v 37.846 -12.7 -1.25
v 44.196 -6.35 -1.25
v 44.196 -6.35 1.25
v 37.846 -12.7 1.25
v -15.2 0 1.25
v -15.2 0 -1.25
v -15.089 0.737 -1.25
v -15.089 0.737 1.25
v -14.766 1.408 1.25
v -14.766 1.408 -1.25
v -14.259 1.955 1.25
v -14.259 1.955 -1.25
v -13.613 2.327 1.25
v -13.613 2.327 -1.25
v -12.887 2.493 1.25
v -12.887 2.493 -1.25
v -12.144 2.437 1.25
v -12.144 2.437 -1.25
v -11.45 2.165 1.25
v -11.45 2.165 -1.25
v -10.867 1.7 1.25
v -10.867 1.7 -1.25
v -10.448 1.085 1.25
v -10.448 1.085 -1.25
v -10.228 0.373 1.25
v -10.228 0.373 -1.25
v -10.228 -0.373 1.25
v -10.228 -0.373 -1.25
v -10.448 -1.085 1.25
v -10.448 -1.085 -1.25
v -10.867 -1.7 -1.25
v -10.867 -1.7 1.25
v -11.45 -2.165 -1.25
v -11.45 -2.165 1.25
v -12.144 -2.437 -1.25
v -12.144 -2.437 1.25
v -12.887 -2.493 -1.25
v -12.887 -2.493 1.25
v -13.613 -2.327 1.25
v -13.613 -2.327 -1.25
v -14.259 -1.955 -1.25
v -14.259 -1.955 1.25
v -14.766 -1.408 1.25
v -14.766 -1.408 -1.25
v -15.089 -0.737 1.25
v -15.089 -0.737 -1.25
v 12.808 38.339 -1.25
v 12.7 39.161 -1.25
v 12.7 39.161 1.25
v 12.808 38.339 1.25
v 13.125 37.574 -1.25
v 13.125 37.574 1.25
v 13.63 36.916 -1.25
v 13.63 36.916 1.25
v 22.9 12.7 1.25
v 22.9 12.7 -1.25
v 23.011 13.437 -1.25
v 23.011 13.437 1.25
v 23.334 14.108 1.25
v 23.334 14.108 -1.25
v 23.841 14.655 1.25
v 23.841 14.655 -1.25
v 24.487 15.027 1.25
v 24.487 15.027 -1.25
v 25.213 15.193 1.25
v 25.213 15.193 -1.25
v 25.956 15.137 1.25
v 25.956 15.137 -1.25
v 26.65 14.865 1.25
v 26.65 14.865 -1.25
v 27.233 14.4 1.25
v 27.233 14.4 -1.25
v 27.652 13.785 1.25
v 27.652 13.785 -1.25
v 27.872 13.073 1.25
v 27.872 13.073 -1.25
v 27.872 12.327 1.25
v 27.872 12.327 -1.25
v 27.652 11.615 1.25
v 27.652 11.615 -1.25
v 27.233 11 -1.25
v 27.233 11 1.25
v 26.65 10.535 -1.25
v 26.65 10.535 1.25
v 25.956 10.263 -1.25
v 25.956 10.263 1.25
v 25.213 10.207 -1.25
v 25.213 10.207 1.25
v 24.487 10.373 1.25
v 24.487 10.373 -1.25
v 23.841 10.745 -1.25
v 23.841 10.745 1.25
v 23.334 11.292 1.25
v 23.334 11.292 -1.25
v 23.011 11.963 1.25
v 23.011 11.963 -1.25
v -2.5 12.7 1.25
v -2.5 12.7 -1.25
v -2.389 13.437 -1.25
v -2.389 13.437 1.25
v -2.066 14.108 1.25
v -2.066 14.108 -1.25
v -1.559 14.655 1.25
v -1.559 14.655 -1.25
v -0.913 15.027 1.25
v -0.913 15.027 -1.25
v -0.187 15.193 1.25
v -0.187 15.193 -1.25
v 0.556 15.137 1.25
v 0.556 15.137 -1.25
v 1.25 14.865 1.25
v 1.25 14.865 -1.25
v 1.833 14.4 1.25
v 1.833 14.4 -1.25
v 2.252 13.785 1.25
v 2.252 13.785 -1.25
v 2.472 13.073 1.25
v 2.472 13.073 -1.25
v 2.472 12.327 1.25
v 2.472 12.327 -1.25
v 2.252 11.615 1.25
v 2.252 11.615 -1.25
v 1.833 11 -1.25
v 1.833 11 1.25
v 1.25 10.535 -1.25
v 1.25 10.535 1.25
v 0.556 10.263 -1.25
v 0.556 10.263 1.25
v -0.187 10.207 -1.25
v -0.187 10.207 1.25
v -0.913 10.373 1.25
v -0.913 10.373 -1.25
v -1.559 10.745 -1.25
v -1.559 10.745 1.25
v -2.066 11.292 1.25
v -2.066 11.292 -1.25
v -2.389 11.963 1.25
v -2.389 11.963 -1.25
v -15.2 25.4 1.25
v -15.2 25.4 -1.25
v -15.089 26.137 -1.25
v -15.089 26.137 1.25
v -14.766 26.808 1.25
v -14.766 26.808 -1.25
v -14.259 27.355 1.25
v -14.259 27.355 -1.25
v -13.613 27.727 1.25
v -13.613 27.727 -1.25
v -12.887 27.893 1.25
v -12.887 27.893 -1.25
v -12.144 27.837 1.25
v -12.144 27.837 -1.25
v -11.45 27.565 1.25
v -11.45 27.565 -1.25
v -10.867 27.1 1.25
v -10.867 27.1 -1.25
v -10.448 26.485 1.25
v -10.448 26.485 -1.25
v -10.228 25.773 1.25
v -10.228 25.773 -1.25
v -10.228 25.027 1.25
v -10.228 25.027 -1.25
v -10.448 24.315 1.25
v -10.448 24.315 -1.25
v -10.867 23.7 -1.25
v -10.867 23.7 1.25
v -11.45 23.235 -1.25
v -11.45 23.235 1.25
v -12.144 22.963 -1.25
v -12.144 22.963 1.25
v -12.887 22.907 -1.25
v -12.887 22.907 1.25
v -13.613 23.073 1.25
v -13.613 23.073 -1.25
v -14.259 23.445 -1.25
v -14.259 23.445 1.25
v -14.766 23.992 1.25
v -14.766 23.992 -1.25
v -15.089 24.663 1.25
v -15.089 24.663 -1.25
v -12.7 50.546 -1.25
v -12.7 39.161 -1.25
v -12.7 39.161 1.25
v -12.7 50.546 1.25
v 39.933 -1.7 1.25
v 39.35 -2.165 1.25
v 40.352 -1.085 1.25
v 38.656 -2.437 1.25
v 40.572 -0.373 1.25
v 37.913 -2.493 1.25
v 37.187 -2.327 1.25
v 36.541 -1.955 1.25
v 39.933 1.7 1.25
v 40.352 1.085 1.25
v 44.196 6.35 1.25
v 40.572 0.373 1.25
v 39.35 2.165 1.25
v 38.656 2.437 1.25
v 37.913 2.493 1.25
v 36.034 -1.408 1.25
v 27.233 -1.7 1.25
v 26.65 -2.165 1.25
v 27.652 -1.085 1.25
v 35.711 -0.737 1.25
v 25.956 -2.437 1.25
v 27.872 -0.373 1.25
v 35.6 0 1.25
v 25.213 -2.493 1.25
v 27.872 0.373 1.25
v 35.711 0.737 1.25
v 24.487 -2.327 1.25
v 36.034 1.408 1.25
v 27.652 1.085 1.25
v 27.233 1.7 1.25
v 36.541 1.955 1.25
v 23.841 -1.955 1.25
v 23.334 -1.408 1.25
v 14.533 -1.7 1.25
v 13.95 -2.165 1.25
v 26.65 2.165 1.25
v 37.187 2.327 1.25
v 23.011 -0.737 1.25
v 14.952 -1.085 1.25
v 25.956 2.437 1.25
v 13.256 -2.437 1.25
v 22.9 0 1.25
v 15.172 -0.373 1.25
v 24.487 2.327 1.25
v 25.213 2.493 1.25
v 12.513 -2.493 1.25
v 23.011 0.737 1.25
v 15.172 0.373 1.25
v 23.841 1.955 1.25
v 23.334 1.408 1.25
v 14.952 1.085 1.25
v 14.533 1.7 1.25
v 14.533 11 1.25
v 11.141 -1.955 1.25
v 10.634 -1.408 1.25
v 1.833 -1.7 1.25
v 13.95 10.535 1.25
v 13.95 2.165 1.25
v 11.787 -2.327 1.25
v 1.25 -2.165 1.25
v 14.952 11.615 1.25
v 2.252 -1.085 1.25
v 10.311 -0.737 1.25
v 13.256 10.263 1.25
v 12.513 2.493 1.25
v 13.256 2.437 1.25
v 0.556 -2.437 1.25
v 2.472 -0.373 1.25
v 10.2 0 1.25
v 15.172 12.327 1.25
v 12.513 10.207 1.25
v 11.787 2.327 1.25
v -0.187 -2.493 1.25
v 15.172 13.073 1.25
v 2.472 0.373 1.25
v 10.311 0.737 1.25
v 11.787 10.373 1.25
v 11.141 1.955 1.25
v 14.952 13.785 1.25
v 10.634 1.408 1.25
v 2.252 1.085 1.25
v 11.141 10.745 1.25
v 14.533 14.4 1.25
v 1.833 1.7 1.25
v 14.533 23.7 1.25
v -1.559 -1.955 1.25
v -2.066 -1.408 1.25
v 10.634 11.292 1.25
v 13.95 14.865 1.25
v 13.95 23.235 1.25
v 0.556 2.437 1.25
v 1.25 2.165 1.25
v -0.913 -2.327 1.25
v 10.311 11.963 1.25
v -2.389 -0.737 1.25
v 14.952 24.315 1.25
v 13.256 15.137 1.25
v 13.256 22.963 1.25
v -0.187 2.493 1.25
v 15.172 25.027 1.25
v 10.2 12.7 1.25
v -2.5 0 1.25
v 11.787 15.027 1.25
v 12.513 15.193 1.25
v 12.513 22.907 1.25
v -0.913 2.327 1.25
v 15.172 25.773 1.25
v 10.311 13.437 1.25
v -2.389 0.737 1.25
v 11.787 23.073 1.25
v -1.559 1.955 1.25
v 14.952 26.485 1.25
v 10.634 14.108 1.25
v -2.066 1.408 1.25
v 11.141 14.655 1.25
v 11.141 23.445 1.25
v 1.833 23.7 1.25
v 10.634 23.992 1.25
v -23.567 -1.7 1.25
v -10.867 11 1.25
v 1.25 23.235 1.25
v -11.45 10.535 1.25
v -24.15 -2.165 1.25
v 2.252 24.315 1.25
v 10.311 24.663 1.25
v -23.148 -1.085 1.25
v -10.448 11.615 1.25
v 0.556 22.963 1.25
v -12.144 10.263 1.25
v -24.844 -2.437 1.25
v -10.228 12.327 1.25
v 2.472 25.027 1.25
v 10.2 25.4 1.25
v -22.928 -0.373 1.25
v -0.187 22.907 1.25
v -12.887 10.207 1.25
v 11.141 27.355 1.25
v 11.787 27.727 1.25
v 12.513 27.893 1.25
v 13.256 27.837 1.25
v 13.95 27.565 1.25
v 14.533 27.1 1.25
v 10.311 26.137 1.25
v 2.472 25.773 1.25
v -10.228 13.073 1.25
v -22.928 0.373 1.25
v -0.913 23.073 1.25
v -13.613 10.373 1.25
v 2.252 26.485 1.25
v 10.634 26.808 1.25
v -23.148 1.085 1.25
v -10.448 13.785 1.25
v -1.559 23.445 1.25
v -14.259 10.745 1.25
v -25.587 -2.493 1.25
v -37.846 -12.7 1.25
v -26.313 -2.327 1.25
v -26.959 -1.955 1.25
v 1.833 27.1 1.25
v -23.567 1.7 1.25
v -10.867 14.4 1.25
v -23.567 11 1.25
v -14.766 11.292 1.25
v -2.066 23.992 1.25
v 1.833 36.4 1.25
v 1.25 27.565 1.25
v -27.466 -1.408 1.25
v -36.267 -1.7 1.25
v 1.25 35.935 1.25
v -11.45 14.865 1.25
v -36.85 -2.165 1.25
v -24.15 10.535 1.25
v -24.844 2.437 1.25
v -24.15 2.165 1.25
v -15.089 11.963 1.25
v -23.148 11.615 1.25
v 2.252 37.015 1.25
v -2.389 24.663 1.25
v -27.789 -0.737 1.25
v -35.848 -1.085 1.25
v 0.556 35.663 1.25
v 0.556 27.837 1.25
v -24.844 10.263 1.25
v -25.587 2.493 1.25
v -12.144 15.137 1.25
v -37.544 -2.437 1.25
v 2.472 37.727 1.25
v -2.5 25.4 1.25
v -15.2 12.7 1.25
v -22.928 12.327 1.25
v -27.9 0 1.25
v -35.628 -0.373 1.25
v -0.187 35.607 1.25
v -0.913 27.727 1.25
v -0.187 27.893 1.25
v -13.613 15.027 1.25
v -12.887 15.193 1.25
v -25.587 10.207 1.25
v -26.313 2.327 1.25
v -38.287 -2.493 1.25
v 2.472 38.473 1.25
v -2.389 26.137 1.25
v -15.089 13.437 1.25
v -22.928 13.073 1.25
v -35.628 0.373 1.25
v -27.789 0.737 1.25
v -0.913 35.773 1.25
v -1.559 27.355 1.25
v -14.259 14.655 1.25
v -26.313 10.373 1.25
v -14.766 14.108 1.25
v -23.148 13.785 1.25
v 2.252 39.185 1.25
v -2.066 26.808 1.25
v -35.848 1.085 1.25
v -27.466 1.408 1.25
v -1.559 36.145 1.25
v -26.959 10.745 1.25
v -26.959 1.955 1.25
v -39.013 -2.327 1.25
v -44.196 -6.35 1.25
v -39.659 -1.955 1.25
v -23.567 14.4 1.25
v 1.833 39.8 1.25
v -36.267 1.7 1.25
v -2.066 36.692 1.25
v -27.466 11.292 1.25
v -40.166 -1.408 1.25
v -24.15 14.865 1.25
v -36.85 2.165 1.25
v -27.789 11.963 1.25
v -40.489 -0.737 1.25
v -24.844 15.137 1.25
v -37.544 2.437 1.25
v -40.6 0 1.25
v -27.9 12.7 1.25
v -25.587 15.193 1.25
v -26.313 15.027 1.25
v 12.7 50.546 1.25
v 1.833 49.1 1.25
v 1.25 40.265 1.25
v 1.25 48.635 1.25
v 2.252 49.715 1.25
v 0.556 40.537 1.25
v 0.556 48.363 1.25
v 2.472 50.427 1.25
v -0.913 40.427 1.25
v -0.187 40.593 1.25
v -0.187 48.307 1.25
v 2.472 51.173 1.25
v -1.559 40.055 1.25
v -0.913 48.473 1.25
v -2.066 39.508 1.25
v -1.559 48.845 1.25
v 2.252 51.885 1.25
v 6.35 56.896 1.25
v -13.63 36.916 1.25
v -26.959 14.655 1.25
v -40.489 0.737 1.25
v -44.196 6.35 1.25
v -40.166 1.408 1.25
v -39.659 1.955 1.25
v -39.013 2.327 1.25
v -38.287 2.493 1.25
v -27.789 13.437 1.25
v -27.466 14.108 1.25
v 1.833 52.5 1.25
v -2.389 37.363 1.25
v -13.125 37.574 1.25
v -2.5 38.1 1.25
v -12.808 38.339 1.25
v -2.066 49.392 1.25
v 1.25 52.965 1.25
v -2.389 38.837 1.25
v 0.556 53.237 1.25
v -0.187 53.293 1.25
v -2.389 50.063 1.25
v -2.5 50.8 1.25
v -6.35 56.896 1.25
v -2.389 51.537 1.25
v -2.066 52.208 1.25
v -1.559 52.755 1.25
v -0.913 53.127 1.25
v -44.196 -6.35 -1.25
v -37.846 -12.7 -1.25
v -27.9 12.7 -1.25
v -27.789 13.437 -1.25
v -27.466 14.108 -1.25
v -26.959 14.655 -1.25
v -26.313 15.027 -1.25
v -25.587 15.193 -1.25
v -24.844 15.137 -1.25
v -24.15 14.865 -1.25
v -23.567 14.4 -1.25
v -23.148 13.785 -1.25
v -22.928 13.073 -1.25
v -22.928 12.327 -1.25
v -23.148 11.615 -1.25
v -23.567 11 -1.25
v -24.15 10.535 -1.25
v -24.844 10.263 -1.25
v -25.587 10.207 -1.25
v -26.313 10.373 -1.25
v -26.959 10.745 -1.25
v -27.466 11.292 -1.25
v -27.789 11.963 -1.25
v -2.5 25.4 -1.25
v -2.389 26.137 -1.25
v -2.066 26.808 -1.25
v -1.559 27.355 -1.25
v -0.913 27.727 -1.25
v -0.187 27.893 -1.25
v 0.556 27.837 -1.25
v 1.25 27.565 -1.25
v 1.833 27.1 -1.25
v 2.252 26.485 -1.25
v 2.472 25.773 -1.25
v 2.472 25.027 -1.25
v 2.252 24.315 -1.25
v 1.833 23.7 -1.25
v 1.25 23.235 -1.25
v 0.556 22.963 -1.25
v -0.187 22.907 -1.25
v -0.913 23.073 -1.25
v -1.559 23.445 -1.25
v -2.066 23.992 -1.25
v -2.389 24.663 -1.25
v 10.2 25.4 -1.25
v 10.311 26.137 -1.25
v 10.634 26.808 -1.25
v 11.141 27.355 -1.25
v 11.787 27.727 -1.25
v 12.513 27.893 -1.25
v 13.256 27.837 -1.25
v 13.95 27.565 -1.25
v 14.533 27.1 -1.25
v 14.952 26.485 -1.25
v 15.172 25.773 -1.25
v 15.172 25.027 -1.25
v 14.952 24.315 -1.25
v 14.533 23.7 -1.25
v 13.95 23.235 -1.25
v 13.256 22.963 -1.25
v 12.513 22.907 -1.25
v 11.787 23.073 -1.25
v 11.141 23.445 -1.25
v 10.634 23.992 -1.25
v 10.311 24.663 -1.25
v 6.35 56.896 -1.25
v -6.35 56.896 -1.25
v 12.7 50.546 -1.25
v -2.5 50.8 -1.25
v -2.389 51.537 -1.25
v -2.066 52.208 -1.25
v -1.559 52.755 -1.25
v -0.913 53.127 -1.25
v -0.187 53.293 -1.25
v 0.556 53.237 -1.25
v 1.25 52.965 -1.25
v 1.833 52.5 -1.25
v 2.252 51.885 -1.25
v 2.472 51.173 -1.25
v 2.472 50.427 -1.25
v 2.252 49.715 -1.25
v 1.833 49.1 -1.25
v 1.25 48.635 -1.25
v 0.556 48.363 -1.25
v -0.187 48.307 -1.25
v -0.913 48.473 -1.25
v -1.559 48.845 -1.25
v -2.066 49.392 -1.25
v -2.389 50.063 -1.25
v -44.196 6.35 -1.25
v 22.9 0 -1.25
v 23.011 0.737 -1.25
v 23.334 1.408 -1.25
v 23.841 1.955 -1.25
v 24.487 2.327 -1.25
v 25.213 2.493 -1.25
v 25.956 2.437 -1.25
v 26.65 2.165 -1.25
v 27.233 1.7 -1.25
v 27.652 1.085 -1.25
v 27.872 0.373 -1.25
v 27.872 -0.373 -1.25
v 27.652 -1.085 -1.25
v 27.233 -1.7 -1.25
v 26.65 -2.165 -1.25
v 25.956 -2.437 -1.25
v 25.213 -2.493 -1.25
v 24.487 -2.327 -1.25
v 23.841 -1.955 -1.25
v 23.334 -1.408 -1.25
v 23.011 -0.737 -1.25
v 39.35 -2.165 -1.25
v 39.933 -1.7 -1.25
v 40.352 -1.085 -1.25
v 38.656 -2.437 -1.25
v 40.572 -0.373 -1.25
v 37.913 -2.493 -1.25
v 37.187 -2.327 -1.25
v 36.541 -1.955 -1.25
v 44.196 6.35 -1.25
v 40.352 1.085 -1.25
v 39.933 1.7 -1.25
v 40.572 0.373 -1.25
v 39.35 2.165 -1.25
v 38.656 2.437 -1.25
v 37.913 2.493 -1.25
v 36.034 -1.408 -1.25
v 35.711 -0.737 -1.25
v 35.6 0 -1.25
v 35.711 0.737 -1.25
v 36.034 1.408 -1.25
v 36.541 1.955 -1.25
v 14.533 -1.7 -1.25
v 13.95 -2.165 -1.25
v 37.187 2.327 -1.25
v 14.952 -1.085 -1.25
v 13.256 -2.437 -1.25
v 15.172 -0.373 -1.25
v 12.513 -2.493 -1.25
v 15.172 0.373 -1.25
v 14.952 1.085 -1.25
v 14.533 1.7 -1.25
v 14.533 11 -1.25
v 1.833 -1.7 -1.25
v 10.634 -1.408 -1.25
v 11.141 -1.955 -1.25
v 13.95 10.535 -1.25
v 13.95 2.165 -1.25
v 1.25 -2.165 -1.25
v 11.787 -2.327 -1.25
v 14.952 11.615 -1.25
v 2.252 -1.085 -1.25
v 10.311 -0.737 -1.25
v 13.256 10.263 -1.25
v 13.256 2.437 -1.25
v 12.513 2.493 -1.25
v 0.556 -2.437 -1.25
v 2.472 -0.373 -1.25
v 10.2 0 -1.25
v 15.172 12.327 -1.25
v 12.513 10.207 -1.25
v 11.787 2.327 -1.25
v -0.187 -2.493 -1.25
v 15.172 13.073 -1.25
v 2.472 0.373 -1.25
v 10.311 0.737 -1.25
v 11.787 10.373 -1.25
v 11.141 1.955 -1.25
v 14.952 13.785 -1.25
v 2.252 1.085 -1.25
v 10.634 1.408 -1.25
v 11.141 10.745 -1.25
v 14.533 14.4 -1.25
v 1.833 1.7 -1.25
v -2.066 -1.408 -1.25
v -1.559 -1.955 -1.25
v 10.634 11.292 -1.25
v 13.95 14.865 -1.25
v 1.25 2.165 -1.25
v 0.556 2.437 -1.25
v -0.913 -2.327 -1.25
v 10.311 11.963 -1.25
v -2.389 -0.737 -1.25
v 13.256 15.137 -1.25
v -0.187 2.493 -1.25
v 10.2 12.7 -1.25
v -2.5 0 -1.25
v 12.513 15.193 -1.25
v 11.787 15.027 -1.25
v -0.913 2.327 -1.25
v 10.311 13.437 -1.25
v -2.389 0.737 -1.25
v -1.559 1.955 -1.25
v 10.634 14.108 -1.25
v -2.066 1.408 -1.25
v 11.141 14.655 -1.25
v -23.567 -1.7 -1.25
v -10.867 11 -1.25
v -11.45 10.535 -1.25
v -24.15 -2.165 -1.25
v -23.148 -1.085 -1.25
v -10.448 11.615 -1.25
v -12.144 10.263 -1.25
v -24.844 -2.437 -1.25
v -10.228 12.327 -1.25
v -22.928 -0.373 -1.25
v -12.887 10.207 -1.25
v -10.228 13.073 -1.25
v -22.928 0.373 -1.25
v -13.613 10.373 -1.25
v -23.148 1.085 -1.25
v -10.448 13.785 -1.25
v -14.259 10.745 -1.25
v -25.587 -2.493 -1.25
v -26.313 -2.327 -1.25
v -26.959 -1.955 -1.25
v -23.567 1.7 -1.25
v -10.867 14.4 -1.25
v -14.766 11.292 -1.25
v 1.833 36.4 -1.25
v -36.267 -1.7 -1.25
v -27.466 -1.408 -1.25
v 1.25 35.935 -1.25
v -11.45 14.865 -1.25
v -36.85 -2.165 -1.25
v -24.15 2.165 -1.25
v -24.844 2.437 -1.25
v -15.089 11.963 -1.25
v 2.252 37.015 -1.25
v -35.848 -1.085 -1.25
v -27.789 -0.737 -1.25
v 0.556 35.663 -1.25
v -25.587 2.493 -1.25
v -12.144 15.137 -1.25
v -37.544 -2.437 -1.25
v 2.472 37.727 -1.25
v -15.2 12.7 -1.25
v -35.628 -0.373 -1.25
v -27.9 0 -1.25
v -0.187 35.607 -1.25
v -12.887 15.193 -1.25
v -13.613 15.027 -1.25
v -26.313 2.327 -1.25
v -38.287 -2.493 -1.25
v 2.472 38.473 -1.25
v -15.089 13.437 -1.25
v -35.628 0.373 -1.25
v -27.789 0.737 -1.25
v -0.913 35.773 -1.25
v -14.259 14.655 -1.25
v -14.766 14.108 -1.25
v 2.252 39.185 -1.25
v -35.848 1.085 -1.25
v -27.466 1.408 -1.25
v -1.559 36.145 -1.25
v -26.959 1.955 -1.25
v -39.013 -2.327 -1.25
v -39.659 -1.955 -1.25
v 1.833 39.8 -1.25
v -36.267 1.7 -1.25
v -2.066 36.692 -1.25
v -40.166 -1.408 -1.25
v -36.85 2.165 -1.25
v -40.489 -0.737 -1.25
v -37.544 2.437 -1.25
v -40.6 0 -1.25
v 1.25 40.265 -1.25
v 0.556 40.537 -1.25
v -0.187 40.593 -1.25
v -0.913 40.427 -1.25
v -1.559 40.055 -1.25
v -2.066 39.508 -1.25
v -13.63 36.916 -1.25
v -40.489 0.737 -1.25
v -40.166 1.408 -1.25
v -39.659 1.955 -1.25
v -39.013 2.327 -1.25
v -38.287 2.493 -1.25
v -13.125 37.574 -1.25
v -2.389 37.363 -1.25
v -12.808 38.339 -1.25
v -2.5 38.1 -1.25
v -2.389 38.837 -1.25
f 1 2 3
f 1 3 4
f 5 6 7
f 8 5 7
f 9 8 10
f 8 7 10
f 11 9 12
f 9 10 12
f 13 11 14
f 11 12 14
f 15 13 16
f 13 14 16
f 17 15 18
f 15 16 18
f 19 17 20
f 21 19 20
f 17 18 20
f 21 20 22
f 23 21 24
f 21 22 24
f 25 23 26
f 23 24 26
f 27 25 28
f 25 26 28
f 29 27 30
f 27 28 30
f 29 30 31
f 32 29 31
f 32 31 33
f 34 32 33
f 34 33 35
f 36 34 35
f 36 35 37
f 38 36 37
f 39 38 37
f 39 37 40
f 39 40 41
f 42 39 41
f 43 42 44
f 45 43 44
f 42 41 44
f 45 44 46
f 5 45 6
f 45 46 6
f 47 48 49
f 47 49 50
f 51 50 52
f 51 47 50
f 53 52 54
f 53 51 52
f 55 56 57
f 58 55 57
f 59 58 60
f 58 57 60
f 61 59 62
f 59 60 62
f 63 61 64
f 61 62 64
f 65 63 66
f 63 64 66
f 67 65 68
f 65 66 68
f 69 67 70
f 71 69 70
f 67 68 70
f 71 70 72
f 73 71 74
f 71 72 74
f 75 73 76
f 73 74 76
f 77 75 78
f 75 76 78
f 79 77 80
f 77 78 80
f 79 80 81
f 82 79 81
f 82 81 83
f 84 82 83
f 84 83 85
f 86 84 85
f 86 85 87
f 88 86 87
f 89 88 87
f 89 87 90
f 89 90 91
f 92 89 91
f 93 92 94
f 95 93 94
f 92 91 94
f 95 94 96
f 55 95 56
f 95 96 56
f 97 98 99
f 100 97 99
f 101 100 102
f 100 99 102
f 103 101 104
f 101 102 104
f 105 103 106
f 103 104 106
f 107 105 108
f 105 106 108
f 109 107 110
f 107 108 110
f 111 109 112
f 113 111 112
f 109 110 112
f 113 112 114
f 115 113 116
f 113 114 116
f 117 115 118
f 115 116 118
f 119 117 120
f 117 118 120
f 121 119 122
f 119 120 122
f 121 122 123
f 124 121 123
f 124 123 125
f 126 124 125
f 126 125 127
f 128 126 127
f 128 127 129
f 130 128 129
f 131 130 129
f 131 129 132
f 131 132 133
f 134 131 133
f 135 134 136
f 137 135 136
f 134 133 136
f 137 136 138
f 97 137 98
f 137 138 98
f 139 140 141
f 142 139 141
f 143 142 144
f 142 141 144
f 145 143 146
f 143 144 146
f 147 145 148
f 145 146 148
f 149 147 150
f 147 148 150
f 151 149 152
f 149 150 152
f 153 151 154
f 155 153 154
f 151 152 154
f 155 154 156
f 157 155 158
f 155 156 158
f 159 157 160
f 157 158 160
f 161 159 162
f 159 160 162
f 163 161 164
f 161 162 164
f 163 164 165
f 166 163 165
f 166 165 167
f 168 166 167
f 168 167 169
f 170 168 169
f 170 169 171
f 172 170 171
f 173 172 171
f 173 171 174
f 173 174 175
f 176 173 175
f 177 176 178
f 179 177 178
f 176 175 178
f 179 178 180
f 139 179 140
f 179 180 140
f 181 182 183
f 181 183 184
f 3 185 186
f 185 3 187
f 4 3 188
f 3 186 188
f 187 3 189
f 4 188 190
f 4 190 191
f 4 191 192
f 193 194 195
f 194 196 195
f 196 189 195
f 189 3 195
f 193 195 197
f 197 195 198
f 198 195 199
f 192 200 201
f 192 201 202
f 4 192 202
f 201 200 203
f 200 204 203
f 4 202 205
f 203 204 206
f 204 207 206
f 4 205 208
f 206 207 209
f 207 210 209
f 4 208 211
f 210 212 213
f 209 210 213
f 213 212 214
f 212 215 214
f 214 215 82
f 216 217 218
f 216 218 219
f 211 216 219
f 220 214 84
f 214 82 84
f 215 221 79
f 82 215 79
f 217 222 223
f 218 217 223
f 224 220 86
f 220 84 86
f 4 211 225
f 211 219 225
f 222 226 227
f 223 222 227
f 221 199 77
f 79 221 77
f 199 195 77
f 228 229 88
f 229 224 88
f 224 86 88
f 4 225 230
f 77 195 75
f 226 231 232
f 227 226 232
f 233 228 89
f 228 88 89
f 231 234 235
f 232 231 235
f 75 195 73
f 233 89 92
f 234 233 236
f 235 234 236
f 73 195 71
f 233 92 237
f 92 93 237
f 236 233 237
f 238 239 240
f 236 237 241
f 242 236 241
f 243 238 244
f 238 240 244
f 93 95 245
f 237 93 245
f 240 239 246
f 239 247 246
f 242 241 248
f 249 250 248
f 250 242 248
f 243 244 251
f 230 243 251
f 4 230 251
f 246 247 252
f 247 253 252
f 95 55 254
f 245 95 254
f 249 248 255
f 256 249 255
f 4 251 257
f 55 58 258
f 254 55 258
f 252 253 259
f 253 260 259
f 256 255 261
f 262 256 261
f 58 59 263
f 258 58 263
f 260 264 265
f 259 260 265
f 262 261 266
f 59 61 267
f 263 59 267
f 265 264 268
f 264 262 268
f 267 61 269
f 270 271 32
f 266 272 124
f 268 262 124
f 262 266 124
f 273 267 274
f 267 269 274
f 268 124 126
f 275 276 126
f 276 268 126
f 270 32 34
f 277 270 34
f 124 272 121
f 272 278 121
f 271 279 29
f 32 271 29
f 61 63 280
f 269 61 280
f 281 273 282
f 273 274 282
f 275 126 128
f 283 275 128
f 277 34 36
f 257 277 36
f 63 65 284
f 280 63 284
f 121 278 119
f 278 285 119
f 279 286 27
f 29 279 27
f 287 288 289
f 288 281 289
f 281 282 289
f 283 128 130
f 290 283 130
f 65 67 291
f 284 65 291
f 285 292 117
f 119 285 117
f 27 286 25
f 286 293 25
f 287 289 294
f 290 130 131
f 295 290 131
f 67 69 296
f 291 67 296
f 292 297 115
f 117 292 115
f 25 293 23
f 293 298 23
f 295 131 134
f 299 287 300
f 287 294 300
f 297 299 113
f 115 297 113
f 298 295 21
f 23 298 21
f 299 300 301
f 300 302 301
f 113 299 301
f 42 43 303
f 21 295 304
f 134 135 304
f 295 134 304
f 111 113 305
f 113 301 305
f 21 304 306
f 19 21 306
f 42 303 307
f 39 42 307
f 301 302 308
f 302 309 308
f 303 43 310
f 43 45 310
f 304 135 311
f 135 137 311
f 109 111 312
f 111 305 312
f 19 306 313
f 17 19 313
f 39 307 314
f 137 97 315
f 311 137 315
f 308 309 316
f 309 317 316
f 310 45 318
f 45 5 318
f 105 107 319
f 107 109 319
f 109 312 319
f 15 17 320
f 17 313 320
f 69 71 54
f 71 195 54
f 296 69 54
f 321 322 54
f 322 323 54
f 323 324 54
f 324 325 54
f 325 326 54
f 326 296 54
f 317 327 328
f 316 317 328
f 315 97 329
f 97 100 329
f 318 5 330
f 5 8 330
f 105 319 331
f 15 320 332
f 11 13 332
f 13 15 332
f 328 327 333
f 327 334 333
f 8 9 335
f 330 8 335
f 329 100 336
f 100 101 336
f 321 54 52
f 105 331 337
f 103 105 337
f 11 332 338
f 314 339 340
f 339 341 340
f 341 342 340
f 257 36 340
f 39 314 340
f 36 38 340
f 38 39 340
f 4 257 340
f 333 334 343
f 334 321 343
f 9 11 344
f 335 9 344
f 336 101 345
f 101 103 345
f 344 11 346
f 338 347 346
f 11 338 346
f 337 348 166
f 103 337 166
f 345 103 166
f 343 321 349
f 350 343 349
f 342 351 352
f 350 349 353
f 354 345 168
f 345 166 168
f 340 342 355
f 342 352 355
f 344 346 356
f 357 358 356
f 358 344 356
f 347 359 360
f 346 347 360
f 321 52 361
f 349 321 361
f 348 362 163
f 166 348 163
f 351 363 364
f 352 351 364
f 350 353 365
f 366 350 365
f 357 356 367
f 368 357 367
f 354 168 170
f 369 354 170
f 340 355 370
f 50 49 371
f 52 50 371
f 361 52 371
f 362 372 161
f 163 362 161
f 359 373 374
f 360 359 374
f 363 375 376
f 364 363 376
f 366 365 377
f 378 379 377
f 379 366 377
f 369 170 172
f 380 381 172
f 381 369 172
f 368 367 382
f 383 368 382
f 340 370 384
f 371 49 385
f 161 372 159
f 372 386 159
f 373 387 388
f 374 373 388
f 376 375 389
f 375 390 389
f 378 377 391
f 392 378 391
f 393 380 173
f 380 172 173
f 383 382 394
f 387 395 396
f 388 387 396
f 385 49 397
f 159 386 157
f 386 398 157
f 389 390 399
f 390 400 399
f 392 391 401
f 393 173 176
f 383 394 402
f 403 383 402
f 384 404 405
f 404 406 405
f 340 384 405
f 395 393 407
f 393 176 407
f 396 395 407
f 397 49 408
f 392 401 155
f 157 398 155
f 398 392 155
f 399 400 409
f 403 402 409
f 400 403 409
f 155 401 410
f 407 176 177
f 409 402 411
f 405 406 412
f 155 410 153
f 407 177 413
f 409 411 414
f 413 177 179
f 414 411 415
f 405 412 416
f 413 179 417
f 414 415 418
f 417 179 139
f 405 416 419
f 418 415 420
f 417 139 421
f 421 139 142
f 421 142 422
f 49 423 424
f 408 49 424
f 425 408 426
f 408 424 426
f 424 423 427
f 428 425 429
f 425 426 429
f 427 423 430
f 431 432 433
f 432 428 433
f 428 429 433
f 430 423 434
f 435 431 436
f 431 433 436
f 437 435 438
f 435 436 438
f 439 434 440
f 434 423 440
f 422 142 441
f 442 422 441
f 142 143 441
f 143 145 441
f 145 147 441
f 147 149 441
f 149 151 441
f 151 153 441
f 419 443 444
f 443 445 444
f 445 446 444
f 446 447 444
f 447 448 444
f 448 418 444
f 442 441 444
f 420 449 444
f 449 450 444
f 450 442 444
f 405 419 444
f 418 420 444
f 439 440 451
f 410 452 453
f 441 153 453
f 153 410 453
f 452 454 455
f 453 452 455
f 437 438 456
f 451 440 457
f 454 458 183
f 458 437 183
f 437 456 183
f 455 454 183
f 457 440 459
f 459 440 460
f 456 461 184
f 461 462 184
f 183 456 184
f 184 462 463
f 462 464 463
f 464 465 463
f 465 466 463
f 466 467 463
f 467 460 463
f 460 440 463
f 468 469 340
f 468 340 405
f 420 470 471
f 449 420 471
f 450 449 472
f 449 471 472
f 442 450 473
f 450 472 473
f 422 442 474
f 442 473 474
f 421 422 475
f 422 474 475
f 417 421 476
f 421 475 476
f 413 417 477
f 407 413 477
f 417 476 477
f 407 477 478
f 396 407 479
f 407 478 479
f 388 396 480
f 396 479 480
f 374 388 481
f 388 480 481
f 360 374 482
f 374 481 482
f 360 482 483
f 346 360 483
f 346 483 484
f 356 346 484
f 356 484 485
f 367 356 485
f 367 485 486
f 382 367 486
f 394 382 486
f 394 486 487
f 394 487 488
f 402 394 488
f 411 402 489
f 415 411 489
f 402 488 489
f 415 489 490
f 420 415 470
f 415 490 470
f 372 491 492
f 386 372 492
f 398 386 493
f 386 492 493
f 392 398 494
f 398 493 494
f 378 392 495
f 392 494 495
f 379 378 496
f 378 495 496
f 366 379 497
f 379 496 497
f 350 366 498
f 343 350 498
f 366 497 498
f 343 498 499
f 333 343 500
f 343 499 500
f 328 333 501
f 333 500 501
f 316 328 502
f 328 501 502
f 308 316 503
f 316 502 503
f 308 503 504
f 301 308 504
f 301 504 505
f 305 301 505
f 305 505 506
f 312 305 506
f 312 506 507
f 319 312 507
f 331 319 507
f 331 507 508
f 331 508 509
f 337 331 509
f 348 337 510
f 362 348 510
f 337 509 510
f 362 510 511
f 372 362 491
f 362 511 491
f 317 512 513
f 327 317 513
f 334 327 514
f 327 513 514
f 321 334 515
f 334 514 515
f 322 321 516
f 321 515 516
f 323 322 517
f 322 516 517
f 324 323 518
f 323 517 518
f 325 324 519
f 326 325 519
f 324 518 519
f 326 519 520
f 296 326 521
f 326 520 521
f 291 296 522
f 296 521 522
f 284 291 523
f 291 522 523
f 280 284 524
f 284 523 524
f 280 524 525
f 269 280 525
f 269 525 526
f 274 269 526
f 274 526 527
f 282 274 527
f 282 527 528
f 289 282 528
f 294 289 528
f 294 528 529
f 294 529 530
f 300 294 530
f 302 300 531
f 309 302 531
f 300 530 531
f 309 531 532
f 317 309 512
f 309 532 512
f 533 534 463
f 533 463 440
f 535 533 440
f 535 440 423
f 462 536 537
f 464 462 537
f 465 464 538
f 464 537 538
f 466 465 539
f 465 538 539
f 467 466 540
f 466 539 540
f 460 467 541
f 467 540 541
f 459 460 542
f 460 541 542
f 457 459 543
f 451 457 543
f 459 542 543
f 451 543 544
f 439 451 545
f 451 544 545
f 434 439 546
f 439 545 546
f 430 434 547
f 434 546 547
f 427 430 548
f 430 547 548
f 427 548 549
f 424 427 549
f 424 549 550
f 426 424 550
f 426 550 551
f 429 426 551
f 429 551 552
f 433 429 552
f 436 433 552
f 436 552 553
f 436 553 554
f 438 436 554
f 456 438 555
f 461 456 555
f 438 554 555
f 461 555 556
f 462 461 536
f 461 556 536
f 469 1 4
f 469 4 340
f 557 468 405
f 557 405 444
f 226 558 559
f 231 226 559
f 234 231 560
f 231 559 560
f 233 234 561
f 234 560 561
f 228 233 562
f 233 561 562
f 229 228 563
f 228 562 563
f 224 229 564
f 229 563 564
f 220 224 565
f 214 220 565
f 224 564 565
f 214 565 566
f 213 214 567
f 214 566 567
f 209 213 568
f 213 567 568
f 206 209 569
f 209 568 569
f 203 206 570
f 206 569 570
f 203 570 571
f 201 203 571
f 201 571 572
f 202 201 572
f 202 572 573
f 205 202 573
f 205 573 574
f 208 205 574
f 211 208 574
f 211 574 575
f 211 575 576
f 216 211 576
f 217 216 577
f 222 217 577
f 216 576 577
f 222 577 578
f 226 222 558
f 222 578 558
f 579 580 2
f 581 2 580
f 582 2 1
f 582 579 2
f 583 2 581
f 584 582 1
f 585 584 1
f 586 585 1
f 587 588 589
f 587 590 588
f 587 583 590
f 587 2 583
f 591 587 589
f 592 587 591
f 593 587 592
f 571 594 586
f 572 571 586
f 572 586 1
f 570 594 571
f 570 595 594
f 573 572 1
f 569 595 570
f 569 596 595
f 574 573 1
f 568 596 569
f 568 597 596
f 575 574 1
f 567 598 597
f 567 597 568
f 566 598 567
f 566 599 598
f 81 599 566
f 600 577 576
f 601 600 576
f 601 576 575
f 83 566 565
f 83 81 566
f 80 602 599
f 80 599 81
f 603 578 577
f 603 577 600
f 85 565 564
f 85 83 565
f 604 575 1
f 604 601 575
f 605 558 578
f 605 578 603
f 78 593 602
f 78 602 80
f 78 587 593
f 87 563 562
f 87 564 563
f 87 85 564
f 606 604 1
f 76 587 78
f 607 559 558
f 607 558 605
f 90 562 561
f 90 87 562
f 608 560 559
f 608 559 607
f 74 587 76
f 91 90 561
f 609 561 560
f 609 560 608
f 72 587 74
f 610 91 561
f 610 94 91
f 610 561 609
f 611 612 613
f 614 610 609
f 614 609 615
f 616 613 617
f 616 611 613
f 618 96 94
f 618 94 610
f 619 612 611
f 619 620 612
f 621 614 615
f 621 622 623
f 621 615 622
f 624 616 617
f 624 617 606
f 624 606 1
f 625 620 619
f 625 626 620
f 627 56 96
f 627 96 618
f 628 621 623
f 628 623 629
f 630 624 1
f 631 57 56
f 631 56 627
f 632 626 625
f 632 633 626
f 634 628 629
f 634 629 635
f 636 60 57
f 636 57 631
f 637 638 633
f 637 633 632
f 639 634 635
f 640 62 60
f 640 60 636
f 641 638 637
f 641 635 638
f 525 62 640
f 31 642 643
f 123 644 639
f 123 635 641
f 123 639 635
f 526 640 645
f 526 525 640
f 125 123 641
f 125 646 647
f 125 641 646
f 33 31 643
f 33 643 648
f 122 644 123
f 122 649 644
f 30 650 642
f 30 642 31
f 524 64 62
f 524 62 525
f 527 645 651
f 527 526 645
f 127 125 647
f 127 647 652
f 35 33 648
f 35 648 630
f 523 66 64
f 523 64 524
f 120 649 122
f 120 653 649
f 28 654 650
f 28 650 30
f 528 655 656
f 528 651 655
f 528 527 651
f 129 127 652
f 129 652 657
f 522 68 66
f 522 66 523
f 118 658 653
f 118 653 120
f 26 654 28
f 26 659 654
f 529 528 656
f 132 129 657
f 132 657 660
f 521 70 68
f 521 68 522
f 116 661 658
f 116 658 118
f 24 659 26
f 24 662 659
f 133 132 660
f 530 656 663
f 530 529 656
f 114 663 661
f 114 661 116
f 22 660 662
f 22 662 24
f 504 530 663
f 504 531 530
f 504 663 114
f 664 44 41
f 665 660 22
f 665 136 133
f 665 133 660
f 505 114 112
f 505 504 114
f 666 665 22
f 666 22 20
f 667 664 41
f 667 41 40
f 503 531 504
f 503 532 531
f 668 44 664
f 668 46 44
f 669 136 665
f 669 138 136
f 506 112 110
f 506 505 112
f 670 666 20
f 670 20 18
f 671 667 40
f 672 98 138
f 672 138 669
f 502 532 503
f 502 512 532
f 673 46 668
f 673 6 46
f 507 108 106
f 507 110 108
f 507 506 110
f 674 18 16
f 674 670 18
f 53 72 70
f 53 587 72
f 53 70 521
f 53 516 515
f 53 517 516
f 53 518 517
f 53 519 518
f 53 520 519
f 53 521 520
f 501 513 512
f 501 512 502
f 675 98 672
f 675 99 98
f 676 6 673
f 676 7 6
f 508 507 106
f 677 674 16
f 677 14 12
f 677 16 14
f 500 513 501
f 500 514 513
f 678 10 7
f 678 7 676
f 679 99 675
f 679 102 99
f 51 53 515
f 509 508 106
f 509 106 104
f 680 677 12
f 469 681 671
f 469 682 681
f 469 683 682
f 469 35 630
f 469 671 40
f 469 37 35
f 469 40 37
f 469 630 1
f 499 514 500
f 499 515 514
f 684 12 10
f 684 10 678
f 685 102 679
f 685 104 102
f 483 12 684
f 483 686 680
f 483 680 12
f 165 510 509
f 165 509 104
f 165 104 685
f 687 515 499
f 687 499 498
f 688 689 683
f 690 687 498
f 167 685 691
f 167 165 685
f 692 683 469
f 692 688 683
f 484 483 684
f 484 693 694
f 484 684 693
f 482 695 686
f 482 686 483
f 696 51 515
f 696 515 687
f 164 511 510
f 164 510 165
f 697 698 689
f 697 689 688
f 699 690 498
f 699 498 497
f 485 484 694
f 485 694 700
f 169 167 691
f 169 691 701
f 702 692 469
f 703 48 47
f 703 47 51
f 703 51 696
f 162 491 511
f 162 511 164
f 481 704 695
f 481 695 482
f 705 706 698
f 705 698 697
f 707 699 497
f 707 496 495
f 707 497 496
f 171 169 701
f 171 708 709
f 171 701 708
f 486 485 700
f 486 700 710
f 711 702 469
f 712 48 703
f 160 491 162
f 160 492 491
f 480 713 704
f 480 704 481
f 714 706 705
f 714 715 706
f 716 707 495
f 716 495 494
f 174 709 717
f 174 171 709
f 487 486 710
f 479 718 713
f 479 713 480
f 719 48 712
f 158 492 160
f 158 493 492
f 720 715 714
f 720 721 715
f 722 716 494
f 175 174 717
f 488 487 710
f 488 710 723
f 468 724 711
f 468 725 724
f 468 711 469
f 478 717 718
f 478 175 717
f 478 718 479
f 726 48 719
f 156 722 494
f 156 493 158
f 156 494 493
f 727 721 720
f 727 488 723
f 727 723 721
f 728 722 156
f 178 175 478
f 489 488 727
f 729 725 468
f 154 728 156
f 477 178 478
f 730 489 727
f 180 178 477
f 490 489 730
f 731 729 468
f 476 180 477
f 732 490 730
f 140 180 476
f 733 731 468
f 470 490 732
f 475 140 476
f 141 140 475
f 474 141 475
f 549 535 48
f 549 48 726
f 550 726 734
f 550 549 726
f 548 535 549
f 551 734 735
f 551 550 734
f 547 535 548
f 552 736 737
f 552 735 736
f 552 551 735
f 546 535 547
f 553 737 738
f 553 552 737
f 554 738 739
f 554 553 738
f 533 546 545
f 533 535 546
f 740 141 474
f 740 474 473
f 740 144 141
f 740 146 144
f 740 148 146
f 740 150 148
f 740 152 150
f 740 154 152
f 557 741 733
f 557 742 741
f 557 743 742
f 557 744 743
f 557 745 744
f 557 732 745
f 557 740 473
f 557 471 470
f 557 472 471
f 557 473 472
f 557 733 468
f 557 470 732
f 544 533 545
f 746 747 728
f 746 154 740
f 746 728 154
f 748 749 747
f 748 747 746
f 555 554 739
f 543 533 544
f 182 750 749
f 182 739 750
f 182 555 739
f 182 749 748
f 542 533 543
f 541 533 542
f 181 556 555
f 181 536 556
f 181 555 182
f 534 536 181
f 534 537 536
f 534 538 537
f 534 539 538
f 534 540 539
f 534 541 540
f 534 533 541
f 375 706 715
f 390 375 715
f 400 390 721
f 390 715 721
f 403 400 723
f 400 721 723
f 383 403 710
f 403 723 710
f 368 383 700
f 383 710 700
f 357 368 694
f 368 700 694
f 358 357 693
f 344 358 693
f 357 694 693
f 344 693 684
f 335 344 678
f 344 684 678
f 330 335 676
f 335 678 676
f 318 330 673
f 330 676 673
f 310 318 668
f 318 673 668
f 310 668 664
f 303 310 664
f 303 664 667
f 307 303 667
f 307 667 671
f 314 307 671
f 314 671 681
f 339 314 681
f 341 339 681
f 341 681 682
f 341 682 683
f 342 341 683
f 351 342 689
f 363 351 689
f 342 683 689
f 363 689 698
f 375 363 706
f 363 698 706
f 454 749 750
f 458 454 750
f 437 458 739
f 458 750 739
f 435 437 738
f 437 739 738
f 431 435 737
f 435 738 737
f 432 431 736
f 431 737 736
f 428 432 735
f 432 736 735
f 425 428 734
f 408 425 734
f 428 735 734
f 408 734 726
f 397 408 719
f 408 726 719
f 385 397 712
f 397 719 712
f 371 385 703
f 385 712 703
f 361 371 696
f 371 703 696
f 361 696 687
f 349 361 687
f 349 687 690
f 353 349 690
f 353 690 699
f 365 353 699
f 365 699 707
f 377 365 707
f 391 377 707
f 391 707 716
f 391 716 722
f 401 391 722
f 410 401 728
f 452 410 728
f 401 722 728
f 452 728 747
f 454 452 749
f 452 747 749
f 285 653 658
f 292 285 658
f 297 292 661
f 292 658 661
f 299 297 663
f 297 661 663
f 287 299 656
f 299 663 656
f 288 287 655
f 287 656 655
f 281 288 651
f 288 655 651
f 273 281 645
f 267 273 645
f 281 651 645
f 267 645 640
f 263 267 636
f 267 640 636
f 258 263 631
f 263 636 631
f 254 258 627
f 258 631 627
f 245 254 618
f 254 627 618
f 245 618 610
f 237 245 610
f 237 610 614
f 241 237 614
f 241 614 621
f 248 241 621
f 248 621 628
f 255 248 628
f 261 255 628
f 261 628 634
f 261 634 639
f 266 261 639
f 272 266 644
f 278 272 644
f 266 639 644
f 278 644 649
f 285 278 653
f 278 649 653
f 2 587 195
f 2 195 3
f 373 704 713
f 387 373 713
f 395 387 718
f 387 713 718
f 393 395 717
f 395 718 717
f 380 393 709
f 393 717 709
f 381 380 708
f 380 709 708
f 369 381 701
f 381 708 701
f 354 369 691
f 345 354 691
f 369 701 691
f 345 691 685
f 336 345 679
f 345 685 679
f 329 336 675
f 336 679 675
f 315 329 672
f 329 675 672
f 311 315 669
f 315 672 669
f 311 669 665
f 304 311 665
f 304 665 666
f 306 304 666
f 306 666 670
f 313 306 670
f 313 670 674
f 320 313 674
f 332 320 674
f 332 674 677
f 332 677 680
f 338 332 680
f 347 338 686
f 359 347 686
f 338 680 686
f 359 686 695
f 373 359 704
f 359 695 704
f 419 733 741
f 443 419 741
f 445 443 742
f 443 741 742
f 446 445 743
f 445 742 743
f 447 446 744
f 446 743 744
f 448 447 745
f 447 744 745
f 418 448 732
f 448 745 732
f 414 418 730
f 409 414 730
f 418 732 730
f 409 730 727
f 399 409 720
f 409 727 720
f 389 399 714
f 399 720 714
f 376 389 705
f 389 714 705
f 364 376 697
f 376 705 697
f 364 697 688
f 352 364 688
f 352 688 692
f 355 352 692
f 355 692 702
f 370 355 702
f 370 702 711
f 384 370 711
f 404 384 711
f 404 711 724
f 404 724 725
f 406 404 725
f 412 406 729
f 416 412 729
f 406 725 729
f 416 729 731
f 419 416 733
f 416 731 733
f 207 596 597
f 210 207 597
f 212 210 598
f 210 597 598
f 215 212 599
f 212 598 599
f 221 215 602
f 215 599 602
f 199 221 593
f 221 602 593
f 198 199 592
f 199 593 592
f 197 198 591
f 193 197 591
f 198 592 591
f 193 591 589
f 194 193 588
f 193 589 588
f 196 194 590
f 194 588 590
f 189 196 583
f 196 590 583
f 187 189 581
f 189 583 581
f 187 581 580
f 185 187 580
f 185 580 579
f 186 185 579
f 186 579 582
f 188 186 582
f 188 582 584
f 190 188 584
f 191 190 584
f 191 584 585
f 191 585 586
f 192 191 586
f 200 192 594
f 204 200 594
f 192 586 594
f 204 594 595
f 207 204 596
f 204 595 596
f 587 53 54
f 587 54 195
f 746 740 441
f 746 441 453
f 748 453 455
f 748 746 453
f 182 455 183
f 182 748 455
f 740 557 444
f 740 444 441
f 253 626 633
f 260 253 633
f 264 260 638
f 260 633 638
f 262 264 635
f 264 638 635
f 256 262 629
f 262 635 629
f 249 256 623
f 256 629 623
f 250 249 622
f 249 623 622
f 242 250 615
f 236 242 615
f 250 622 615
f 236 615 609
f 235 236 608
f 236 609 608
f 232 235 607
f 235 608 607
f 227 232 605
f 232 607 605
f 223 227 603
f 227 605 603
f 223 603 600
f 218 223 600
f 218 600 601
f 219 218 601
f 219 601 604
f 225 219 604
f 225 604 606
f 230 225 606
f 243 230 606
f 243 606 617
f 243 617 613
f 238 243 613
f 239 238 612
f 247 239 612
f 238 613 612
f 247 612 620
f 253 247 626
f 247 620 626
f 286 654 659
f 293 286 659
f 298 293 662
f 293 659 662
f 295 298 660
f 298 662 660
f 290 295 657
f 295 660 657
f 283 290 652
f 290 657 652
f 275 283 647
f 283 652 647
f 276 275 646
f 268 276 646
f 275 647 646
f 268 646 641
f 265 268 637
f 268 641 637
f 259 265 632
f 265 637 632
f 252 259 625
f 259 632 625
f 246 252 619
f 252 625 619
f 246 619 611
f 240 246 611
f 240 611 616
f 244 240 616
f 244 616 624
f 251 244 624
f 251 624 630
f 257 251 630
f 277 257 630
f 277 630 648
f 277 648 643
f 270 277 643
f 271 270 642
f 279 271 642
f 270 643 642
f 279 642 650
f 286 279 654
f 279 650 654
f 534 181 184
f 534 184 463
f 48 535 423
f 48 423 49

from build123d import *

# Parameters (mm, degrees)
SKETCH1_R           = 2.5
BOSS_EXTRUDE1_DEPTH = 2.5


with BuildPart() as part:
    # Sketch1 → Boss-Extrude1 (new body)
    with BuildSketch(Plane(origin=(0, 0, -1.25), x_dir=(-1, 0, 0), z_dir=(0, 0, -1))):
        with BuildLine():
            Line((44.196, 6.35), (13.62993597, 36.91606403))
            ThreePointArc((13.62993597, 36.91606403), (12.941682484, 37.946108163), (12.7, 39.161128061))
            Line((12.7, 39.161128061), (12.7, 50.546))
            Line((12.7, 50.546), (6.35, 56.896))
            Line((6.35, 56.896), (-6.35, 56.896))
            Line((-6.35, 56.896), (-12.7, 50.546))
            Line((-12.7, 50.546), (-12.7, 39.161128061))
            ThreePointArc((-12.7, 39.161128061), (-12.941682484, 37.946108163), (-13.62993597, 36.91606403))
            Line((-13.62993597, 36.91606403), (-44.196, 6.35))
            Line((-44.196, 6.35), (-44.196, -6.35))
            Line((-44.196, -6.35), (-37.846, -12.7))
            Line((-37.846, -12.7), (37.846, -12.7))
            Line((37.846, -12.7), (44.196, -6.35))
            Line((44.196, -6.35), (44.196, 6.35))
        make_face()
        with Locations((0, 50.8)):
            Circle(SKETCH1_R, mode=Mode.SUBTRACT)
        with Locations((0, 38.1)):
            Circle(SKETCH1_R, mode=Mode.SUBTRACT)
        with Locations((-38.1, 0)):
            Circle(SKETCH1_R, mode=Mode.SUBTRACT)
        with Locations((-25.4, 0)):
            Circle(SKETCH1_R, mode=Mode.SUBTRACT)
        with Locations((-12.7, 0)):
            Circle(SKETCH1_R, mode=Mode.SUBTRACT)
        Circle(SKETCH1_R, mode=Mode.SUBTRACT)
        with Locations((12.7, 0)):
            Circle(SKETCH1_R, mode=Mode.SUBTRACT)
        with Locations((38.1, 0)):
            Circle(SKETCH1_R, mode=Mode.SUBTRACT)
        with Locations((25.4, 0)):
            Circle(SKETCH1_R, mode=Mode.SUBTRACT)
        with Locations((0, 12.7)):
            Circle(SKETCH1_R, mode=Mode.SUBTRACT)
        with Locations((0, 25.4)):
            Circle(SKETCH1_R, mode=Mode.SUBTRACT)
        with Locations((25.4, 12.7)):
            Circle(SKETCH1_R, mode=Mode.SUBTRACT)
        with Locations((12.7, 12.7)):
            Circle(SKETCH1_R, mode=Mode.SUBTRACT)
        with Locations((12.7, 25.4)):
            Circle(SKETCH1_R, mode=Mode.SUBTRACT)
        with Locations((-12.7, 12.7)):
            Circle(SKETCH1_R, mode=Mode.SUBTRACT)
        with Locations((-12.7, 25.4)):
            Circle(SKETCH1_R, mode=Mode.SUBTRACT)
        with Locations((-25.4, 12.7)):
            Circle(SKETCH1_R, mode=Mode.SUBTRACT)
    extrude(amount=-BOSS_EXTRUDE1_DEPTH)


solid = part.part
